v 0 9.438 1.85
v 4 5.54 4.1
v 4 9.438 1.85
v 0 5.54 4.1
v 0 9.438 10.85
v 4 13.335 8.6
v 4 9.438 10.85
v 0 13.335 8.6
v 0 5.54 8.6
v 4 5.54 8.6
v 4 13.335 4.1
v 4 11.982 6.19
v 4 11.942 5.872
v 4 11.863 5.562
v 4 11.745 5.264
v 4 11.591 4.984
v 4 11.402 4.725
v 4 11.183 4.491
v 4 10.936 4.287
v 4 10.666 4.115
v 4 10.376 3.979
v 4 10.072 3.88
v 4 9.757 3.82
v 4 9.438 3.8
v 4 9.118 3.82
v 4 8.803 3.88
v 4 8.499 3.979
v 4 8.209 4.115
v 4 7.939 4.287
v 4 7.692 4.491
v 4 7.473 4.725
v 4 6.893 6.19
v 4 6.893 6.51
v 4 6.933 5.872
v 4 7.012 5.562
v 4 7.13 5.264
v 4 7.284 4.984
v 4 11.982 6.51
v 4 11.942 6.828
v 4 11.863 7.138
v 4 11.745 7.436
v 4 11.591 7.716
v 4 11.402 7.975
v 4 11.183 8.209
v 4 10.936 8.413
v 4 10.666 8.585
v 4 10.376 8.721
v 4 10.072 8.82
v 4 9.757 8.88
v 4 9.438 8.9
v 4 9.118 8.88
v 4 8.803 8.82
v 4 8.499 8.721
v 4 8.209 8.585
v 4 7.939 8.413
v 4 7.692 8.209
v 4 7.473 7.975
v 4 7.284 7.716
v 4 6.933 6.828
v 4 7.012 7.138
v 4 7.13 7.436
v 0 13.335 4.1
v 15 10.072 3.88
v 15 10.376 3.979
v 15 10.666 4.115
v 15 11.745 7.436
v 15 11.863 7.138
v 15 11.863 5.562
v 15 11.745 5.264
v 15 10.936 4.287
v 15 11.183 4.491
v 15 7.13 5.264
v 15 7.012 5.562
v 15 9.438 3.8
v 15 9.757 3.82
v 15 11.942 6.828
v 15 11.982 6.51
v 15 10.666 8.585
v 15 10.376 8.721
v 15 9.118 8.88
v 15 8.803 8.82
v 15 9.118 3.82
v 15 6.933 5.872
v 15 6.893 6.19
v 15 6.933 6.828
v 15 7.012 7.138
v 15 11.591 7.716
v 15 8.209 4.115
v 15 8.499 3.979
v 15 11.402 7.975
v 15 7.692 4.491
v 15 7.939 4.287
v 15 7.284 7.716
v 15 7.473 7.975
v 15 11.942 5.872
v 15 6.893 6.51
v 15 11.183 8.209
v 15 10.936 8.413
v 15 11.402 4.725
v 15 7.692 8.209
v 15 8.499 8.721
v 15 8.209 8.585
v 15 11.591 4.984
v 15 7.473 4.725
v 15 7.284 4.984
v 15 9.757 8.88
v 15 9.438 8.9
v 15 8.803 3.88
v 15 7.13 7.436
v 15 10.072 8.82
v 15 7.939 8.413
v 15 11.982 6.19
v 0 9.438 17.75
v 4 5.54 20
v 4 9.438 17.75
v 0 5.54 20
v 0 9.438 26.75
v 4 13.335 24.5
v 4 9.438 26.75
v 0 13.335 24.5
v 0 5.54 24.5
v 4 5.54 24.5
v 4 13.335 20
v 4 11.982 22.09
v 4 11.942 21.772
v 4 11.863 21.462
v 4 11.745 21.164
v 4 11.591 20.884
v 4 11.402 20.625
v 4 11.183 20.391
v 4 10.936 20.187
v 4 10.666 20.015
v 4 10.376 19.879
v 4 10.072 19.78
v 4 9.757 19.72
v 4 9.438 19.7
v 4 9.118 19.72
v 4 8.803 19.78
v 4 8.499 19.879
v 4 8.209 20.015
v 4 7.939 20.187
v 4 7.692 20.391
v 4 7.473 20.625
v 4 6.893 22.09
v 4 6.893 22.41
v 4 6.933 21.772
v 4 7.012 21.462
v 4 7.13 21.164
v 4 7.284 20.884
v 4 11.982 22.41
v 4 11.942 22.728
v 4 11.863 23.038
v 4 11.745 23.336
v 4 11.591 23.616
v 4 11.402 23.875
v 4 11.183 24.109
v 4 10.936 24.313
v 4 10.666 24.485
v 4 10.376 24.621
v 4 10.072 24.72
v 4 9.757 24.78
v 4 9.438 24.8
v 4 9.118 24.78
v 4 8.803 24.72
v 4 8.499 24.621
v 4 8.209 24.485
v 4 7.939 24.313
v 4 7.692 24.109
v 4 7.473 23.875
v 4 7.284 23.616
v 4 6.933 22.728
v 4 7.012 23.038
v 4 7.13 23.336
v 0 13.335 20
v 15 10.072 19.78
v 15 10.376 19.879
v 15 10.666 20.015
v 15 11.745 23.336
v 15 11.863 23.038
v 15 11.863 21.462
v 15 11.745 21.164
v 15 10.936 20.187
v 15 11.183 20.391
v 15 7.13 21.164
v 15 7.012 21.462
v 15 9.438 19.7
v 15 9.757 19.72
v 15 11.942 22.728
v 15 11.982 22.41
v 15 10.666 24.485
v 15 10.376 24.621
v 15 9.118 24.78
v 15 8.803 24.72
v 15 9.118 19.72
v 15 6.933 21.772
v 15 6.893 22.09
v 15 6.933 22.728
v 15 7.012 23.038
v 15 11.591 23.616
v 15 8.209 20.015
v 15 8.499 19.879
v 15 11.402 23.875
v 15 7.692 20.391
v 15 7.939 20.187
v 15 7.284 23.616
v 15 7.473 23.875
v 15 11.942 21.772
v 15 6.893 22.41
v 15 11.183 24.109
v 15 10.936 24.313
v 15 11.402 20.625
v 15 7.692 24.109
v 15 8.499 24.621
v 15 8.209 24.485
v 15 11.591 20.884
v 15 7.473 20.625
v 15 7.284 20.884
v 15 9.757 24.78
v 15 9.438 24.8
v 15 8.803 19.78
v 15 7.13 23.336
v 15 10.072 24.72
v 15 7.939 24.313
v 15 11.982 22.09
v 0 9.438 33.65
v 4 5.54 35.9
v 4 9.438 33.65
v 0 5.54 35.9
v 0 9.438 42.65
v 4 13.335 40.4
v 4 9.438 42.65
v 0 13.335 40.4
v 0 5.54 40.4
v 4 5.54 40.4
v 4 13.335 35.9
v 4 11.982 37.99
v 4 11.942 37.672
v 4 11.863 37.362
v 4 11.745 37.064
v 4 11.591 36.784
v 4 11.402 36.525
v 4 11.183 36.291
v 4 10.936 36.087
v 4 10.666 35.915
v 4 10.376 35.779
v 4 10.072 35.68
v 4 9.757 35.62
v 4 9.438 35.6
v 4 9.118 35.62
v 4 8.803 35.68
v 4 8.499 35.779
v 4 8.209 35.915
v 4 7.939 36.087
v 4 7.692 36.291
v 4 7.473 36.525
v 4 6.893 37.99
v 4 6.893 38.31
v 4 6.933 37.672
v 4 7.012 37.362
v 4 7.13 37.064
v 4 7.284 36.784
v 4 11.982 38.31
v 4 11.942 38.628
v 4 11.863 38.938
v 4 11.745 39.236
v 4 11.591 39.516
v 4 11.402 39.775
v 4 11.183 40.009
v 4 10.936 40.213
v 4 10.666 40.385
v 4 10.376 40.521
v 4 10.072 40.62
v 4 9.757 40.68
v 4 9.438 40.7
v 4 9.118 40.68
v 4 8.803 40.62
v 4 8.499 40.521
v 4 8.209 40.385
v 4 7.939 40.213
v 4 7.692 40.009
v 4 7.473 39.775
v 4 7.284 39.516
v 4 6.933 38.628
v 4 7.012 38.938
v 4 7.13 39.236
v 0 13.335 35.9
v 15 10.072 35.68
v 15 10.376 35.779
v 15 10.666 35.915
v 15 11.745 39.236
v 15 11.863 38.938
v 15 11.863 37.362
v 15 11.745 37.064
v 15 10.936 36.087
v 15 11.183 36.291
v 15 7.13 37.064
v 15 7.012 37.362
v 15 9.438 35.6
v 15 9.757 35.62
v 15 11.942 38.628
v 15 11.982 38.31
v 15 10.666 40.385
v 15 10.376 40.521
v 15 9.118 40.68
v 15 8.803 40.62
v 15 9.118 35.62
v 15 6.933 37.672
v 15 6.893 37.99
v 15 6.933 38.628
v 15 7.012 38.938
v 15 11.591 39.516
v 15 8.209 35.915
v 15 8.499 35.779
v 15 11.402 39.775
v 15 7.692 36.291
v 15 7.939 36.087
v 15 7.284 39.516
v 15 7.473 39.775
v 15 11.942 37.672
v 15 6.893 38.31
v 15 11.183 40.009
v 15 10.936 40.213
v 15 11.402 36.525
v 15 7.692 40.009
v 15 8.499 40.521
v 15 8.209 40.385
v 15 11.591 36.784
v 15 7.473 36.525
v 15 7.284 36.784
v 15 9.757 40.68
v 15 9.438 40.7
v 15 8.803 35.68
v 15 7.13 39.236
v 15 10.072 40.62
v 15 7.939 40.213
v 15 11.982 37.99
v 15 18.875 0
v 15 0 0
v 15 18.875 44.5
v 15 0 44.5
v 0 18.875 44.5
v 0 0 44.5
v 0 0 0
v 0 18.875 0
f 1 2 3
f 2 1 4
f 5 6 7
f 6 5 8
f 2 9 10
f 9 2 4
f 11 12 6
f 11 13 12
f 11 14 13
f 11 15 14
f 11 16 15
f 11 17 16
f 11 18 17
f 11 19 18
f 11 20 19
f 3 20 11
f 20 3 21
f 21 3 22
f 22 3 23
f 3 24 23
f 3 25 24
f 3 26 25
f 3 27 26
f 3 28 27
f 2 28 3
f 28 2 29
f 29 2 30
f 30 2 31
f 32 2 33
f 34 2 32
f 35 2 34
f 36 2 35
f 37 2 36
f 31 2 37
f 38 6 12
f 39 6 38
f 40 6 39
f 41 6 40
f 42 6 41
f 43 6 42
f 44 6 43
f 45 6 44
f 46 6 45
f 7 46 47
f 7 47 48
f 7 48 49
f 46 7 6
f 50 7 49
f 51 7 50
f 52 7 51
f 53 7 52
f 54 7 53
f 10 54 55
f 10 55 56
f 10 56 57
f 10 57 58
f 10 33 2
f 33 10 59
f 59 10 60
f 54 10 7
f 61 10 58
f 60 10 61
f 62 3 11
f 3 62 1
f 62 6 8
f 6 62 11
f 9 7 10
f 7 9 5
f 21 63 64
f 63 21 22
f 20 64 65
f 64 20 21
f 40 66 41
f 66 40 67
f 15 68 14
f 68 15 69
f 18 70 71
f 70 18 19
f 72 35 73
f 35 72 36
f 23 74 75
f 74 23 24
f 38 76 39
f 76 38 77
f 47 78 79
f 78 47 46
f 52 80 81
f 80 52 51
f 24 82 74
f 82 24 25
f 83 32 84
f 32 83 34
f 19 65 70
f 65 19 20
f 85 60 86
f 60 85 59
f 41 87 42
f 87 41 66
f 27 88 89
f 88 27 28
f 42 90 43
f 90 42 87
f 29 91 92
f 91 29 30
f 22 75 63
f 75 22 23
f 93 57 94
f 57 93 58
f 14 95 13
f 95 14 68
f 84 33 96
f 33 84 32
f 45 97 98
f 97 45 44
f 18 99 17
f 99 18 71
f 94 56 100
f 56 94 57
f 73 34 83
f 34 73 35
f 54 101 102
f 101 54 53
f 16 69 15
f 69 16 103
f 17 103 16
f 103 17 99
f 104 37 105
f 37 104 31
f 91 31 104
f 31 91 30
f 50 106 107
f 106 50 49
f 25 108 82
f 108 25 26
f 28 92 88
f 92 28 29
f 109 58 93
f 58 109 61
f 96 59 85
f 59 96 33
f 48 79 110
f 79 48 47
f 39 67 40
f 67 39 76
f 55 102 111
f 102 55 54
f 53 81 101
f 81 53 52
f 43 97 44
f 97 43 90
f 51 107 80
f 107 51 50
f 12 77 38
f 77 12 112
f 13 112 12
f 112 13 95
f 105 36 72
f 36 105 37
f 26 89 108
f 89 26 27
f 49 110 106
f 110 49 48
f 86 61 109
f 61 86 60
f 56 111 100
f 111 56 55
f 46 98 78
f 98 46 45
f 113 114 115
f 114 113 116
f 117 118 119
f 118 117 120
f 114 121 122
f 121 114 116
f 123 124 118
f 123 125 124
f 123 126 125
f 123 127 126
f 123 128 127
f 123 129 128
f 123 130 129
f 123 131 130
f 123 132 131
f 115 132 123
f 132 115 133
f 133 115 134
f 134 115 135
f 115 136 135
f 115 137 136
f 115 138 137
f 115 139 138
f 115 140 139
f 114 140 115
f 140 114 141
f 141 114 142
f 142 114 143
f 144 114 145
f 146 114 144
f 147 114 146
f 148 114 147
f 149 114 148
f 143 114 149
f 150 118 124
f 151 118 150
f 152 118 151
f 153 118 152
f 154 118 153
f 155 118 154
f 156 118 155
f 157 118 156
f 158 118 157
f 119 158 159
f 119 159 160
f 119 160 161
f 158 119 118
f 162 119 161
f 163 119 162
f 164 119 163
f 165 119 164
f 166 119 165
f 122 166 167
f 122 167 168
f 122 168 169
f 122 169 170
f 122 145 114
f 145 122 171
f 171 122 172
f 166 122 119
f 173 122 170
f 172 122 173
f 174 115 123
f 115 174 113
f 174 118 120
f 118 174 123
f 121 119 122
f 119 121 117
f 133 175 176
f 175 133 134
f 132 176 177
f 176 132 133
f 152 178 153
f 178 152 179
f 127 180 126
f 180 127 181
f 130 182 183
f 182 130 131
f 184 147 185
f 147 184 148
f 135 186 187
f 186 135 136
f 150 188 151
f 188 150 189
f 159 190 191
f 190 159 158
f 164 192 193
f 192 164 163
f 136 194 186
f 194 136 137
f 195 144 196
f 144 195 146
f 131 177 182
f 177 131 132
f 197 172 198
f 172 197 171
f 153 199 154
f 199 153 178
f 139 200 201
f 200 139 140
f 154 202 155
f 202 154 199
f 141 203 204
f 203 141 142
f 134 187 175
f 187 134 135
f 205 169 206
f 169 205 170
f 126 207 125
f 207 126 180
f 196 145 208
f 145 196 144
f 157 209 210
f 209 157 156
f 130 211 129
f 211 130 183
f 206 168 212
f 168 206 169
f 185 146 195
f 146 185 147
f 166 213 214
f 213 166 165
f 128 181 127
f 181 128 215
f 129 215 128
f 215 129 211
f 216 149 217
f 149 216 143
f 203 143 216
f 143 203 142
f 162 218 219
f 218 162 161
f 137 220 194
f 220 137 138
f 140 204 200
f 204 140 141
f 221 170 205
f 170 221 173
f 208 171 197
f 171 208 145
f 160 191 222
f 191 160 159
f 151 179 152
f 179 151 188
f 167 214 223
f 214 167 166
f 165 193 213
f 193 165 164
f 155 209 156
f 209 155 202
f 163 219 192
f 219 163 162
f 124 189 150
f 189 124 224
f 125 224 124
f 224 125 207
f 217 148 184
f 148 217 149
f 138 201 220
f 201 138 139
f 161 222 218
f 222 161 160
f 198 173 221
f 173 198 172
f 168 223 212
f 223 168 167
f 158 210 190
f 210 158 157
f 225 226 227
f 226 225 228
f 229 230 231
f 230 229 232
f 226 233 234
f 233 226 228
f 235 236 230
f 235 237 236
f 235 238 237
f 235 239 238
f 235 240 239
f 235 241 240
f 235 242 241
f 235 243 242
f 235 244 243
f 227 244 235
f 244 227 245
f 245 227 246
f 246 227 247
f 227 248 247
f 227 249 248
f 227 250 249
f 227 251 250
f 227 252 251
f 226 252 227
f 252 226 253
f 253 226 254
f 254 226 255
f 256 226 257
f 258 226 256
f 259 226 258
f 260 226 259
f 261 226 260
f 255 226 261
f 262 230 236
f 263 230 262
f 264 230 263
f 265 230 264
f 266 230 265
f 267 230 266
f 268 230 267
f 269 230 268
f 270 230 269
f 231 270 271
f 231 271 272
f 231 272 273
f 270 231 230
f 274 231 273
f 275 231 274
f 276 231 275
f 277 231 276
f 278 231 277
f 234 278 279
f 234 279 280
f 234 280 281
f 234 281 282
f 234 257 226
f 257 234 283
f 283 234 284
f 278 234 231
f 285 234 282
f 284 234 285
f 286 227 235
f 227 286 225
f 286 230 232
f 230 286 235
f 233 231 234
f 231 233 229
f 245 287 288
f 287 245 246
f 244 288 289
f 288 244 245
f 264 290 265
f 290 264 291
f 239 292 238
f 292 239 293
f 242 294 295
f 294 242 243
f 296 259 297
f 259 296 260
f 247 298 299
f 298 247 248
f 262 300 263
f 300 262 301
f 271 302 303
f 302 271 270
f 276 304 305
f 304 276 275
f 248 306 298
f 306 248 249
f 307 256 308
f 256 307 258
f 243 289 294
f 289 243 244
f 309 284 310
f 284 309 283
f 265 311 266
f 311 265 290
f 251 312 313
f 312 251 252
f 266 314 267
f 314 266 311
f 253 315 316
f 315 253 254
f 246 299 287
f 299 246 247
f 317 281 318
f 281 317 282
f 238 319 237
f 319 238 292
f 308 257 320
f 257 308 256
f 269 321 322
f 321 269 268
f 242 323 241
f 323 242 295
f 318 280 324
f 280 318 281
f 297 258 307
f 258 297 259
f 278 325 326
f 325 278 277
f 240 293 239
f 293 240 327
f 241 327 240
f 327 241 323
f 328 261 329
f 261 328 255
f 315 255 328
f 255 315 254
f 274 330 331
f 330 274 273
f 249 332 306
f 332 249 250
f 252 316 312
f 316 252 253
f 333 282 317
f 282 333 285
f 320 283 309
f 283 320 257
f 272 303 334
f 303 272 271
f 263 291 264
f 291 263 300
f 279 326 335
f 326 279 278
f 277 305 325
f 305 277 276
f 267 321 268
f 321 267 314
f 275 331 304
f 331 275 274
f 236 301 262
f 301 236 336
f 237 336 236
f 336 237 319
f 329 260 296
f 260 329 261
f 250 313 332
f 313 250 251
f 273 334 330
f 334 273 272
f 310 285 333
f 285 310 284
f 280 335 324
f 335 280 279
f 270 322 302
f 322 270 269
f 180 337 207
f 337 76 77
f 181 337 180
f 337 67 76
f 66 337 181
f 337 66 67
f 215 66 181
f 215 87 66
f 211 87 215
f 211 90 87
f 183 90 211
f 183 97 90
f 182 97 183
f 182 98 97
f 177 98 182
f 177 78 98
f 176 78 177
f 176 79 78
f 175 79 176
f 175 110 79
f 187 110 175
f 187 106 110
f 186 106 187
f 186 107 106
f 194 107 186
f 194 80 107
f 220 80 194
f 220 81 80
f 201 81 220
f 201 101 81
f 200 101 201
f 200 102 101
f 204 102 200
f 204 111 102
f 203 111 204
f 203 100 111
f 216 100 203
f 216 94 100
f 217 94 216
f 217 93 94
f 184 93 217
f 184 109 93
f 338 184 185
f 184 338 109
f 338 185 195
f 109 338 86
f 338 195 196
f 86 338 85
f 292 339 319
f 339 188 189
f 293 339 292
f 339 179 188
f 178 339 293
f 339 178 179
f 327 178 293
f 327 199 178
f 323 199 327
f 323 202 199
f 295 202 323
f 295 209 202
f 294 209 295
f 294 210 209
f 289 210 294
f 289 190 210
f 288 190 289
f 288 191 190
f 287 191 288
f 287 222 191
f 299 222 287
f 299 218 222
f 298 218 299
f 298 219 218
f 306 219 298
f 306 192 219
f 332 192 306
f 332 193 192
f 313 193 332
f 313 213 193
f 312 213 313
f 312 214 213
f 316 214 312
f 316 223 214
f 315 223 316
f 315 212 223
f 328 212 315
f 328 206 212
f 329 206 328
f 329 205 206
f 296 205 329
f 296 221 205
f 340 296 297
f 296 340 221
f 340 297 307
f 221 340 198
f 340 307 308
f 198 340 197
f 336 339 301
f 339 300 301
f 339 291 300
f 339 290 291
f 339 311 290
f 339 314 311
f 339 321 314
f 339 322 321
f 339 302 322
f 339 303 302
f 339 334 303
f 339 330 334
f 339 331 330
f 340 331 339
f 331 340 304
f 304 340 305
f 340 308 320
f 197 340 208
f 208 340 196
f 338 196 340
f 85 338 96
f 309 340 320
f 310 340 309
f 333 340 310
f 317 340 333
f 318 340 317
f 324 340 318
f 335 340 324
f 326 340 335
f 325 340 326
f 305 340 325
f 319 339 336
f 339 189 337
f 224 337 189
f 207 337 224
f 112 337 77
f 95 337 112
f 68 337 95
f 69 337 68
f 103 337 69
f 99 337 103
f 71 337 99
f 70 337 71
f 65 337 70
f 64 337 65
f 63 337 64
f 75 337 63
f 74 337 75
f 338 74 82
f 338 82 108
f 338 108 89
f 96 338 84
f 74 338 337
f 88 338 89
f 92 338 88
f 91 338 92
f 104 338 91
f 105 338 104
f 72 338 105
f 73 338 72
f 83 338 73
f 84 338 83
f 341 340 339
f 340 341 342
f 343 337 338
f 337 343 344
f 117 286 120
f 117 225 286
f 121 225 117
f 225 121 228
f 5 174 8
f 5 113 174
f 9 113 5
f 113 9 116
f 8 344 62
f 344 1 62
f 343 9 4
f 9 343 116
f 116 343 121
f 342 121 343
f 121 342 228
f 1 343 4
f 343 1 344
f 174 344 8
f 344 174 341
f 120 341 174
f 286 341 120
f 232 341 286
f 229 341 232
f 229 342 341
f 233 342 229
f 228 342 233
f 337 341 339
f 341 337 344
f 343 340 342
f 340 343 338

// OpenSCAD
// file: _defaults.scad
ru_rail_width_mm = 18.875;
ru_rail_height_mm = 44.5;
ru_rail_thread_endDistance_mm = 6.35;
h2sr_rail_depth_mm = 15;
h2sr_m5bolt_housing_gain_mm = 0.1;
h2sr_m5bolt_housing_mm = 5 + h2sr_m5bolt_housing_gain_mm;
h2sr_m5nut_height_mm = 4;
h2sr_m5nut_housing_radius_mm = 9;
// main file
include <_defaults.scad>

m_rail(1);

module m_rail(size) {
    m_rail_1u();

    module m_rail_1u() {
        difference() {
            cube([h2sr_rail_depth_mm, ru_rail_width_mm, ru_rail_height_mm]);
            m_rail_m5_bottomThread();
            m_rail_m5_centerThread();
            m_rail_m5_topThread();
        }

        module m_rail_m5_bottomThread() {
            translate([0, ru_rail_width_mm / 2, ru_rail_thread_endDistance_mm])
            m_rail_m5_thread();
        }

        module m_rail_m5_centerThread() {
            translate([0, ru_rail_width_mm / 2, ru_rail_height_mm / 2])
            m_rail_m5_thread();
        }

        module m_rail_m5_topThread() {
            translate([0, ru_rail_width_mm / 2, ru_rail_height_mm - ru_rail_thread_endDistance_mm])
            m_rail_m5_thread();
        }

        module m_rail_m5_thread() {
            union() {
                translate([-0.1, 0, 0])
                rotate([0, 90, 0])
                cylinder(h = h2sr_m5nut_height_mm + 0.1, r = h2sr_m5nut_housing_radius_mm / 2, $fn = 6);
                translate([h2sr_m5nut_height_mm - 0.1, 0, 0])
                rotate([0, 90, 0])
                cylinder(h = (h2sr_rail_depth_mm - h2sr_m5nut_height_mm) + 0.2, r = h2sr_m5bolt_housing_mm / 2, $fn = 50);
            }
        }
    }
}
